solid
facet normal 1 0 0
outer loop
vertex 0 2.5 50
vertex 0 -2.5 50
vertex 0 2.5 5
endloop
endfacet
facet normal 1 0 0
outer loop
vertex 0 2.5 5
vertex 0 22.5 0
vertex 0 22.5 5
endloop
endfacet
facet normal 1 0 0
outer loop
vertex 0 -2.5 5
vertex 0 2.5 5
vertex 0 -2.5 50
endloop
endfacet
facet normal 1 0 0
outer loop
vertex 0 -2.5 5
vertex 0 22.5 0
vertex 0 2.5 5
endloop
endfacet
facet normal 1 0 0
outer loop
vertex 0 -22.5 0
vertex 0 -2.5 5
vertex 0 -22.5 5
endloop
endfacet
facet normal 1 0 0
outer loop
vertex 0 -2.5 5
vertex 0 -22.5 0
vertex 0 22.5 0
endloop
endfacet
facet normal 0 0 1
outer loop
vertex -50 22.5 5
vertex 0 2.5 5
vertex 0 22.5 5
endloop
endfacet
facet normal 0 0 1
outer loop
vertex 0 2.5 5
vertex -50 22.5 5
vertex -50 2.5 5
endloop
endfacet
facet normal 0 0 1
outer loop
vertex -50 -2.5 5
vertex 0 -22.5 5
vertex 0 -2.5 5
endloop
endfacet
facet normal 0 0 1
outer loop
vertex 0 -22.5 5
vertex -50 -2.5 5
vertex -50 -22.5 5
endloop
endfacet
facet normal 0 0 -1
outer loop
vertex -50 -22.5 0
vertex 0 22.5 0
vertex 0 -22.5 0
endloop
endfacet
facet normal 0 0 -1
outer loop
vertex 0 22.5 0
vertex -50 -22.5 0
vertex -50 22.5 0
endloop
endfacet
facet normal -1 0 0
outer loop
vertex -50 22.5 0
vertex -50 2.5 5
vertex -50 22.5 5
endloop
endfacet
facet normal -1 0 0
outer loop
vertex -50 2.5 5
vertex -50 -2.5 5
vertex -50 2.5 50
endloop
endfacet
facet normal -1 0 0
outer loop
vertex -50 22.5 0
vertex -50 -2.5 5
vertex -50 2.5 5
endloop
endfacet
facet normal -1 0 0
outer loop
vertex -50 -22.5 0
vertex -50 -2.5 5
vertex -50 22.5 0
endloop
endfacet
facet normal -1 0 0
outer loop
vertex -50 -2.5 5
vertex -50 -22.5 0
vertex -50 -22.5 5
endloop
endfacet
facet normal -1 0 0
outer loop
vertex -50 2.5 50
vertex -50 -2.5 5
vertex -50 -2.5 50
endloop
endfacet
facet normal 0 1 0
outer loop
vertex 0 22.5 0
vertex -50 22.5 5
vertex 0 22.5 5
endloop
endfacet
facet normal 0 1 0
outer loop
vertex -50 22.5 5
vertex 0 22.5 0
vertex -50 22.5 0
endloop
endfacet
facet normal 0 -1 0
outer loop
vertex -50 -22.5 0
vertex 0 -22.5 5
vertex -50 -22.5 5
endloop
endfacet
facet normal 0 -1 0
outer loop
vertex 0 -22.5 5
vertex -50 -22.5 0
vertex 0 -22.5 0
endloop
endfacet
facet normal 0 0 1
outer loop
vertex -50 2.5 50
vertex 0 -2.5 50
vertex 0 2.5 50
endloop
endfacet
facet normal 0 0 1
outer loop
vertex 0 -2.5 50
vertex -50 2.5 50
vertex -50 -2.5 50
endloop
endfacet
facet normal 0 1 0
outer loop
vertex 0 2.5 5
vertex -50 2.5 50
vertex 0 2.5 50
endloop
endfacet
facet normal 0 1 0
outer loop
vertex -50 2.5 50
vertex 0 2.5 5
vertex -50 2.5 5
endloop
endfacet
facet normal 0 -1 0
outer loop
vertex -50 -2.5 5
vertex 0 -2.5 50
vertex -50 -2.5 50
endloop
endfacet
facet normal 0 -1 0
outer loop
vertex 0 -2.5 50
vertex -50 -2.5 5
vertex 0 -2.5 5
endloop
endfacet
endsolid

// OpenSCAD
// Built by bench/smallmodels/features/compiler.py from a list of features.
$fn = 64;
difference() {
  union() {
    translate([-25, 0, 0]) translate([-25, -22.5, 0]) cube([50, 45, 5]);
    translate([-25, 0, 0]) translate([-25, -2.5, 0]) cube([50, 5, 50]);
  }
  union() {
    translate([-17, 30, 3.75]) rotate([0, 0, 0]) rotate([0, 90, 0]) cylinder(d = 4.5, h = 1200, center = true);
    translate([17, 30, 3.75]) rotate([0, 0, 0]) rotate([0, 90, 0]) cylinder(d = 4.5, h = 1200, center = true);
  }
}
difference() {
  union() {
    translate([-25, 0, 0]) translate([-25, -2.5, 0]) cube([50, 5, 50]);
  }
  union() {
    translate([0, 17.5, 44.99]) rotate([0, 0, 0]) cylinder(d = 23, h = 5.02);
    translate([0, 17.5, 28]) rotate([0, 0, 0]) translate([-1.7, -15.5, 0]) cube([3.4, 31, 31]);
  }
}
